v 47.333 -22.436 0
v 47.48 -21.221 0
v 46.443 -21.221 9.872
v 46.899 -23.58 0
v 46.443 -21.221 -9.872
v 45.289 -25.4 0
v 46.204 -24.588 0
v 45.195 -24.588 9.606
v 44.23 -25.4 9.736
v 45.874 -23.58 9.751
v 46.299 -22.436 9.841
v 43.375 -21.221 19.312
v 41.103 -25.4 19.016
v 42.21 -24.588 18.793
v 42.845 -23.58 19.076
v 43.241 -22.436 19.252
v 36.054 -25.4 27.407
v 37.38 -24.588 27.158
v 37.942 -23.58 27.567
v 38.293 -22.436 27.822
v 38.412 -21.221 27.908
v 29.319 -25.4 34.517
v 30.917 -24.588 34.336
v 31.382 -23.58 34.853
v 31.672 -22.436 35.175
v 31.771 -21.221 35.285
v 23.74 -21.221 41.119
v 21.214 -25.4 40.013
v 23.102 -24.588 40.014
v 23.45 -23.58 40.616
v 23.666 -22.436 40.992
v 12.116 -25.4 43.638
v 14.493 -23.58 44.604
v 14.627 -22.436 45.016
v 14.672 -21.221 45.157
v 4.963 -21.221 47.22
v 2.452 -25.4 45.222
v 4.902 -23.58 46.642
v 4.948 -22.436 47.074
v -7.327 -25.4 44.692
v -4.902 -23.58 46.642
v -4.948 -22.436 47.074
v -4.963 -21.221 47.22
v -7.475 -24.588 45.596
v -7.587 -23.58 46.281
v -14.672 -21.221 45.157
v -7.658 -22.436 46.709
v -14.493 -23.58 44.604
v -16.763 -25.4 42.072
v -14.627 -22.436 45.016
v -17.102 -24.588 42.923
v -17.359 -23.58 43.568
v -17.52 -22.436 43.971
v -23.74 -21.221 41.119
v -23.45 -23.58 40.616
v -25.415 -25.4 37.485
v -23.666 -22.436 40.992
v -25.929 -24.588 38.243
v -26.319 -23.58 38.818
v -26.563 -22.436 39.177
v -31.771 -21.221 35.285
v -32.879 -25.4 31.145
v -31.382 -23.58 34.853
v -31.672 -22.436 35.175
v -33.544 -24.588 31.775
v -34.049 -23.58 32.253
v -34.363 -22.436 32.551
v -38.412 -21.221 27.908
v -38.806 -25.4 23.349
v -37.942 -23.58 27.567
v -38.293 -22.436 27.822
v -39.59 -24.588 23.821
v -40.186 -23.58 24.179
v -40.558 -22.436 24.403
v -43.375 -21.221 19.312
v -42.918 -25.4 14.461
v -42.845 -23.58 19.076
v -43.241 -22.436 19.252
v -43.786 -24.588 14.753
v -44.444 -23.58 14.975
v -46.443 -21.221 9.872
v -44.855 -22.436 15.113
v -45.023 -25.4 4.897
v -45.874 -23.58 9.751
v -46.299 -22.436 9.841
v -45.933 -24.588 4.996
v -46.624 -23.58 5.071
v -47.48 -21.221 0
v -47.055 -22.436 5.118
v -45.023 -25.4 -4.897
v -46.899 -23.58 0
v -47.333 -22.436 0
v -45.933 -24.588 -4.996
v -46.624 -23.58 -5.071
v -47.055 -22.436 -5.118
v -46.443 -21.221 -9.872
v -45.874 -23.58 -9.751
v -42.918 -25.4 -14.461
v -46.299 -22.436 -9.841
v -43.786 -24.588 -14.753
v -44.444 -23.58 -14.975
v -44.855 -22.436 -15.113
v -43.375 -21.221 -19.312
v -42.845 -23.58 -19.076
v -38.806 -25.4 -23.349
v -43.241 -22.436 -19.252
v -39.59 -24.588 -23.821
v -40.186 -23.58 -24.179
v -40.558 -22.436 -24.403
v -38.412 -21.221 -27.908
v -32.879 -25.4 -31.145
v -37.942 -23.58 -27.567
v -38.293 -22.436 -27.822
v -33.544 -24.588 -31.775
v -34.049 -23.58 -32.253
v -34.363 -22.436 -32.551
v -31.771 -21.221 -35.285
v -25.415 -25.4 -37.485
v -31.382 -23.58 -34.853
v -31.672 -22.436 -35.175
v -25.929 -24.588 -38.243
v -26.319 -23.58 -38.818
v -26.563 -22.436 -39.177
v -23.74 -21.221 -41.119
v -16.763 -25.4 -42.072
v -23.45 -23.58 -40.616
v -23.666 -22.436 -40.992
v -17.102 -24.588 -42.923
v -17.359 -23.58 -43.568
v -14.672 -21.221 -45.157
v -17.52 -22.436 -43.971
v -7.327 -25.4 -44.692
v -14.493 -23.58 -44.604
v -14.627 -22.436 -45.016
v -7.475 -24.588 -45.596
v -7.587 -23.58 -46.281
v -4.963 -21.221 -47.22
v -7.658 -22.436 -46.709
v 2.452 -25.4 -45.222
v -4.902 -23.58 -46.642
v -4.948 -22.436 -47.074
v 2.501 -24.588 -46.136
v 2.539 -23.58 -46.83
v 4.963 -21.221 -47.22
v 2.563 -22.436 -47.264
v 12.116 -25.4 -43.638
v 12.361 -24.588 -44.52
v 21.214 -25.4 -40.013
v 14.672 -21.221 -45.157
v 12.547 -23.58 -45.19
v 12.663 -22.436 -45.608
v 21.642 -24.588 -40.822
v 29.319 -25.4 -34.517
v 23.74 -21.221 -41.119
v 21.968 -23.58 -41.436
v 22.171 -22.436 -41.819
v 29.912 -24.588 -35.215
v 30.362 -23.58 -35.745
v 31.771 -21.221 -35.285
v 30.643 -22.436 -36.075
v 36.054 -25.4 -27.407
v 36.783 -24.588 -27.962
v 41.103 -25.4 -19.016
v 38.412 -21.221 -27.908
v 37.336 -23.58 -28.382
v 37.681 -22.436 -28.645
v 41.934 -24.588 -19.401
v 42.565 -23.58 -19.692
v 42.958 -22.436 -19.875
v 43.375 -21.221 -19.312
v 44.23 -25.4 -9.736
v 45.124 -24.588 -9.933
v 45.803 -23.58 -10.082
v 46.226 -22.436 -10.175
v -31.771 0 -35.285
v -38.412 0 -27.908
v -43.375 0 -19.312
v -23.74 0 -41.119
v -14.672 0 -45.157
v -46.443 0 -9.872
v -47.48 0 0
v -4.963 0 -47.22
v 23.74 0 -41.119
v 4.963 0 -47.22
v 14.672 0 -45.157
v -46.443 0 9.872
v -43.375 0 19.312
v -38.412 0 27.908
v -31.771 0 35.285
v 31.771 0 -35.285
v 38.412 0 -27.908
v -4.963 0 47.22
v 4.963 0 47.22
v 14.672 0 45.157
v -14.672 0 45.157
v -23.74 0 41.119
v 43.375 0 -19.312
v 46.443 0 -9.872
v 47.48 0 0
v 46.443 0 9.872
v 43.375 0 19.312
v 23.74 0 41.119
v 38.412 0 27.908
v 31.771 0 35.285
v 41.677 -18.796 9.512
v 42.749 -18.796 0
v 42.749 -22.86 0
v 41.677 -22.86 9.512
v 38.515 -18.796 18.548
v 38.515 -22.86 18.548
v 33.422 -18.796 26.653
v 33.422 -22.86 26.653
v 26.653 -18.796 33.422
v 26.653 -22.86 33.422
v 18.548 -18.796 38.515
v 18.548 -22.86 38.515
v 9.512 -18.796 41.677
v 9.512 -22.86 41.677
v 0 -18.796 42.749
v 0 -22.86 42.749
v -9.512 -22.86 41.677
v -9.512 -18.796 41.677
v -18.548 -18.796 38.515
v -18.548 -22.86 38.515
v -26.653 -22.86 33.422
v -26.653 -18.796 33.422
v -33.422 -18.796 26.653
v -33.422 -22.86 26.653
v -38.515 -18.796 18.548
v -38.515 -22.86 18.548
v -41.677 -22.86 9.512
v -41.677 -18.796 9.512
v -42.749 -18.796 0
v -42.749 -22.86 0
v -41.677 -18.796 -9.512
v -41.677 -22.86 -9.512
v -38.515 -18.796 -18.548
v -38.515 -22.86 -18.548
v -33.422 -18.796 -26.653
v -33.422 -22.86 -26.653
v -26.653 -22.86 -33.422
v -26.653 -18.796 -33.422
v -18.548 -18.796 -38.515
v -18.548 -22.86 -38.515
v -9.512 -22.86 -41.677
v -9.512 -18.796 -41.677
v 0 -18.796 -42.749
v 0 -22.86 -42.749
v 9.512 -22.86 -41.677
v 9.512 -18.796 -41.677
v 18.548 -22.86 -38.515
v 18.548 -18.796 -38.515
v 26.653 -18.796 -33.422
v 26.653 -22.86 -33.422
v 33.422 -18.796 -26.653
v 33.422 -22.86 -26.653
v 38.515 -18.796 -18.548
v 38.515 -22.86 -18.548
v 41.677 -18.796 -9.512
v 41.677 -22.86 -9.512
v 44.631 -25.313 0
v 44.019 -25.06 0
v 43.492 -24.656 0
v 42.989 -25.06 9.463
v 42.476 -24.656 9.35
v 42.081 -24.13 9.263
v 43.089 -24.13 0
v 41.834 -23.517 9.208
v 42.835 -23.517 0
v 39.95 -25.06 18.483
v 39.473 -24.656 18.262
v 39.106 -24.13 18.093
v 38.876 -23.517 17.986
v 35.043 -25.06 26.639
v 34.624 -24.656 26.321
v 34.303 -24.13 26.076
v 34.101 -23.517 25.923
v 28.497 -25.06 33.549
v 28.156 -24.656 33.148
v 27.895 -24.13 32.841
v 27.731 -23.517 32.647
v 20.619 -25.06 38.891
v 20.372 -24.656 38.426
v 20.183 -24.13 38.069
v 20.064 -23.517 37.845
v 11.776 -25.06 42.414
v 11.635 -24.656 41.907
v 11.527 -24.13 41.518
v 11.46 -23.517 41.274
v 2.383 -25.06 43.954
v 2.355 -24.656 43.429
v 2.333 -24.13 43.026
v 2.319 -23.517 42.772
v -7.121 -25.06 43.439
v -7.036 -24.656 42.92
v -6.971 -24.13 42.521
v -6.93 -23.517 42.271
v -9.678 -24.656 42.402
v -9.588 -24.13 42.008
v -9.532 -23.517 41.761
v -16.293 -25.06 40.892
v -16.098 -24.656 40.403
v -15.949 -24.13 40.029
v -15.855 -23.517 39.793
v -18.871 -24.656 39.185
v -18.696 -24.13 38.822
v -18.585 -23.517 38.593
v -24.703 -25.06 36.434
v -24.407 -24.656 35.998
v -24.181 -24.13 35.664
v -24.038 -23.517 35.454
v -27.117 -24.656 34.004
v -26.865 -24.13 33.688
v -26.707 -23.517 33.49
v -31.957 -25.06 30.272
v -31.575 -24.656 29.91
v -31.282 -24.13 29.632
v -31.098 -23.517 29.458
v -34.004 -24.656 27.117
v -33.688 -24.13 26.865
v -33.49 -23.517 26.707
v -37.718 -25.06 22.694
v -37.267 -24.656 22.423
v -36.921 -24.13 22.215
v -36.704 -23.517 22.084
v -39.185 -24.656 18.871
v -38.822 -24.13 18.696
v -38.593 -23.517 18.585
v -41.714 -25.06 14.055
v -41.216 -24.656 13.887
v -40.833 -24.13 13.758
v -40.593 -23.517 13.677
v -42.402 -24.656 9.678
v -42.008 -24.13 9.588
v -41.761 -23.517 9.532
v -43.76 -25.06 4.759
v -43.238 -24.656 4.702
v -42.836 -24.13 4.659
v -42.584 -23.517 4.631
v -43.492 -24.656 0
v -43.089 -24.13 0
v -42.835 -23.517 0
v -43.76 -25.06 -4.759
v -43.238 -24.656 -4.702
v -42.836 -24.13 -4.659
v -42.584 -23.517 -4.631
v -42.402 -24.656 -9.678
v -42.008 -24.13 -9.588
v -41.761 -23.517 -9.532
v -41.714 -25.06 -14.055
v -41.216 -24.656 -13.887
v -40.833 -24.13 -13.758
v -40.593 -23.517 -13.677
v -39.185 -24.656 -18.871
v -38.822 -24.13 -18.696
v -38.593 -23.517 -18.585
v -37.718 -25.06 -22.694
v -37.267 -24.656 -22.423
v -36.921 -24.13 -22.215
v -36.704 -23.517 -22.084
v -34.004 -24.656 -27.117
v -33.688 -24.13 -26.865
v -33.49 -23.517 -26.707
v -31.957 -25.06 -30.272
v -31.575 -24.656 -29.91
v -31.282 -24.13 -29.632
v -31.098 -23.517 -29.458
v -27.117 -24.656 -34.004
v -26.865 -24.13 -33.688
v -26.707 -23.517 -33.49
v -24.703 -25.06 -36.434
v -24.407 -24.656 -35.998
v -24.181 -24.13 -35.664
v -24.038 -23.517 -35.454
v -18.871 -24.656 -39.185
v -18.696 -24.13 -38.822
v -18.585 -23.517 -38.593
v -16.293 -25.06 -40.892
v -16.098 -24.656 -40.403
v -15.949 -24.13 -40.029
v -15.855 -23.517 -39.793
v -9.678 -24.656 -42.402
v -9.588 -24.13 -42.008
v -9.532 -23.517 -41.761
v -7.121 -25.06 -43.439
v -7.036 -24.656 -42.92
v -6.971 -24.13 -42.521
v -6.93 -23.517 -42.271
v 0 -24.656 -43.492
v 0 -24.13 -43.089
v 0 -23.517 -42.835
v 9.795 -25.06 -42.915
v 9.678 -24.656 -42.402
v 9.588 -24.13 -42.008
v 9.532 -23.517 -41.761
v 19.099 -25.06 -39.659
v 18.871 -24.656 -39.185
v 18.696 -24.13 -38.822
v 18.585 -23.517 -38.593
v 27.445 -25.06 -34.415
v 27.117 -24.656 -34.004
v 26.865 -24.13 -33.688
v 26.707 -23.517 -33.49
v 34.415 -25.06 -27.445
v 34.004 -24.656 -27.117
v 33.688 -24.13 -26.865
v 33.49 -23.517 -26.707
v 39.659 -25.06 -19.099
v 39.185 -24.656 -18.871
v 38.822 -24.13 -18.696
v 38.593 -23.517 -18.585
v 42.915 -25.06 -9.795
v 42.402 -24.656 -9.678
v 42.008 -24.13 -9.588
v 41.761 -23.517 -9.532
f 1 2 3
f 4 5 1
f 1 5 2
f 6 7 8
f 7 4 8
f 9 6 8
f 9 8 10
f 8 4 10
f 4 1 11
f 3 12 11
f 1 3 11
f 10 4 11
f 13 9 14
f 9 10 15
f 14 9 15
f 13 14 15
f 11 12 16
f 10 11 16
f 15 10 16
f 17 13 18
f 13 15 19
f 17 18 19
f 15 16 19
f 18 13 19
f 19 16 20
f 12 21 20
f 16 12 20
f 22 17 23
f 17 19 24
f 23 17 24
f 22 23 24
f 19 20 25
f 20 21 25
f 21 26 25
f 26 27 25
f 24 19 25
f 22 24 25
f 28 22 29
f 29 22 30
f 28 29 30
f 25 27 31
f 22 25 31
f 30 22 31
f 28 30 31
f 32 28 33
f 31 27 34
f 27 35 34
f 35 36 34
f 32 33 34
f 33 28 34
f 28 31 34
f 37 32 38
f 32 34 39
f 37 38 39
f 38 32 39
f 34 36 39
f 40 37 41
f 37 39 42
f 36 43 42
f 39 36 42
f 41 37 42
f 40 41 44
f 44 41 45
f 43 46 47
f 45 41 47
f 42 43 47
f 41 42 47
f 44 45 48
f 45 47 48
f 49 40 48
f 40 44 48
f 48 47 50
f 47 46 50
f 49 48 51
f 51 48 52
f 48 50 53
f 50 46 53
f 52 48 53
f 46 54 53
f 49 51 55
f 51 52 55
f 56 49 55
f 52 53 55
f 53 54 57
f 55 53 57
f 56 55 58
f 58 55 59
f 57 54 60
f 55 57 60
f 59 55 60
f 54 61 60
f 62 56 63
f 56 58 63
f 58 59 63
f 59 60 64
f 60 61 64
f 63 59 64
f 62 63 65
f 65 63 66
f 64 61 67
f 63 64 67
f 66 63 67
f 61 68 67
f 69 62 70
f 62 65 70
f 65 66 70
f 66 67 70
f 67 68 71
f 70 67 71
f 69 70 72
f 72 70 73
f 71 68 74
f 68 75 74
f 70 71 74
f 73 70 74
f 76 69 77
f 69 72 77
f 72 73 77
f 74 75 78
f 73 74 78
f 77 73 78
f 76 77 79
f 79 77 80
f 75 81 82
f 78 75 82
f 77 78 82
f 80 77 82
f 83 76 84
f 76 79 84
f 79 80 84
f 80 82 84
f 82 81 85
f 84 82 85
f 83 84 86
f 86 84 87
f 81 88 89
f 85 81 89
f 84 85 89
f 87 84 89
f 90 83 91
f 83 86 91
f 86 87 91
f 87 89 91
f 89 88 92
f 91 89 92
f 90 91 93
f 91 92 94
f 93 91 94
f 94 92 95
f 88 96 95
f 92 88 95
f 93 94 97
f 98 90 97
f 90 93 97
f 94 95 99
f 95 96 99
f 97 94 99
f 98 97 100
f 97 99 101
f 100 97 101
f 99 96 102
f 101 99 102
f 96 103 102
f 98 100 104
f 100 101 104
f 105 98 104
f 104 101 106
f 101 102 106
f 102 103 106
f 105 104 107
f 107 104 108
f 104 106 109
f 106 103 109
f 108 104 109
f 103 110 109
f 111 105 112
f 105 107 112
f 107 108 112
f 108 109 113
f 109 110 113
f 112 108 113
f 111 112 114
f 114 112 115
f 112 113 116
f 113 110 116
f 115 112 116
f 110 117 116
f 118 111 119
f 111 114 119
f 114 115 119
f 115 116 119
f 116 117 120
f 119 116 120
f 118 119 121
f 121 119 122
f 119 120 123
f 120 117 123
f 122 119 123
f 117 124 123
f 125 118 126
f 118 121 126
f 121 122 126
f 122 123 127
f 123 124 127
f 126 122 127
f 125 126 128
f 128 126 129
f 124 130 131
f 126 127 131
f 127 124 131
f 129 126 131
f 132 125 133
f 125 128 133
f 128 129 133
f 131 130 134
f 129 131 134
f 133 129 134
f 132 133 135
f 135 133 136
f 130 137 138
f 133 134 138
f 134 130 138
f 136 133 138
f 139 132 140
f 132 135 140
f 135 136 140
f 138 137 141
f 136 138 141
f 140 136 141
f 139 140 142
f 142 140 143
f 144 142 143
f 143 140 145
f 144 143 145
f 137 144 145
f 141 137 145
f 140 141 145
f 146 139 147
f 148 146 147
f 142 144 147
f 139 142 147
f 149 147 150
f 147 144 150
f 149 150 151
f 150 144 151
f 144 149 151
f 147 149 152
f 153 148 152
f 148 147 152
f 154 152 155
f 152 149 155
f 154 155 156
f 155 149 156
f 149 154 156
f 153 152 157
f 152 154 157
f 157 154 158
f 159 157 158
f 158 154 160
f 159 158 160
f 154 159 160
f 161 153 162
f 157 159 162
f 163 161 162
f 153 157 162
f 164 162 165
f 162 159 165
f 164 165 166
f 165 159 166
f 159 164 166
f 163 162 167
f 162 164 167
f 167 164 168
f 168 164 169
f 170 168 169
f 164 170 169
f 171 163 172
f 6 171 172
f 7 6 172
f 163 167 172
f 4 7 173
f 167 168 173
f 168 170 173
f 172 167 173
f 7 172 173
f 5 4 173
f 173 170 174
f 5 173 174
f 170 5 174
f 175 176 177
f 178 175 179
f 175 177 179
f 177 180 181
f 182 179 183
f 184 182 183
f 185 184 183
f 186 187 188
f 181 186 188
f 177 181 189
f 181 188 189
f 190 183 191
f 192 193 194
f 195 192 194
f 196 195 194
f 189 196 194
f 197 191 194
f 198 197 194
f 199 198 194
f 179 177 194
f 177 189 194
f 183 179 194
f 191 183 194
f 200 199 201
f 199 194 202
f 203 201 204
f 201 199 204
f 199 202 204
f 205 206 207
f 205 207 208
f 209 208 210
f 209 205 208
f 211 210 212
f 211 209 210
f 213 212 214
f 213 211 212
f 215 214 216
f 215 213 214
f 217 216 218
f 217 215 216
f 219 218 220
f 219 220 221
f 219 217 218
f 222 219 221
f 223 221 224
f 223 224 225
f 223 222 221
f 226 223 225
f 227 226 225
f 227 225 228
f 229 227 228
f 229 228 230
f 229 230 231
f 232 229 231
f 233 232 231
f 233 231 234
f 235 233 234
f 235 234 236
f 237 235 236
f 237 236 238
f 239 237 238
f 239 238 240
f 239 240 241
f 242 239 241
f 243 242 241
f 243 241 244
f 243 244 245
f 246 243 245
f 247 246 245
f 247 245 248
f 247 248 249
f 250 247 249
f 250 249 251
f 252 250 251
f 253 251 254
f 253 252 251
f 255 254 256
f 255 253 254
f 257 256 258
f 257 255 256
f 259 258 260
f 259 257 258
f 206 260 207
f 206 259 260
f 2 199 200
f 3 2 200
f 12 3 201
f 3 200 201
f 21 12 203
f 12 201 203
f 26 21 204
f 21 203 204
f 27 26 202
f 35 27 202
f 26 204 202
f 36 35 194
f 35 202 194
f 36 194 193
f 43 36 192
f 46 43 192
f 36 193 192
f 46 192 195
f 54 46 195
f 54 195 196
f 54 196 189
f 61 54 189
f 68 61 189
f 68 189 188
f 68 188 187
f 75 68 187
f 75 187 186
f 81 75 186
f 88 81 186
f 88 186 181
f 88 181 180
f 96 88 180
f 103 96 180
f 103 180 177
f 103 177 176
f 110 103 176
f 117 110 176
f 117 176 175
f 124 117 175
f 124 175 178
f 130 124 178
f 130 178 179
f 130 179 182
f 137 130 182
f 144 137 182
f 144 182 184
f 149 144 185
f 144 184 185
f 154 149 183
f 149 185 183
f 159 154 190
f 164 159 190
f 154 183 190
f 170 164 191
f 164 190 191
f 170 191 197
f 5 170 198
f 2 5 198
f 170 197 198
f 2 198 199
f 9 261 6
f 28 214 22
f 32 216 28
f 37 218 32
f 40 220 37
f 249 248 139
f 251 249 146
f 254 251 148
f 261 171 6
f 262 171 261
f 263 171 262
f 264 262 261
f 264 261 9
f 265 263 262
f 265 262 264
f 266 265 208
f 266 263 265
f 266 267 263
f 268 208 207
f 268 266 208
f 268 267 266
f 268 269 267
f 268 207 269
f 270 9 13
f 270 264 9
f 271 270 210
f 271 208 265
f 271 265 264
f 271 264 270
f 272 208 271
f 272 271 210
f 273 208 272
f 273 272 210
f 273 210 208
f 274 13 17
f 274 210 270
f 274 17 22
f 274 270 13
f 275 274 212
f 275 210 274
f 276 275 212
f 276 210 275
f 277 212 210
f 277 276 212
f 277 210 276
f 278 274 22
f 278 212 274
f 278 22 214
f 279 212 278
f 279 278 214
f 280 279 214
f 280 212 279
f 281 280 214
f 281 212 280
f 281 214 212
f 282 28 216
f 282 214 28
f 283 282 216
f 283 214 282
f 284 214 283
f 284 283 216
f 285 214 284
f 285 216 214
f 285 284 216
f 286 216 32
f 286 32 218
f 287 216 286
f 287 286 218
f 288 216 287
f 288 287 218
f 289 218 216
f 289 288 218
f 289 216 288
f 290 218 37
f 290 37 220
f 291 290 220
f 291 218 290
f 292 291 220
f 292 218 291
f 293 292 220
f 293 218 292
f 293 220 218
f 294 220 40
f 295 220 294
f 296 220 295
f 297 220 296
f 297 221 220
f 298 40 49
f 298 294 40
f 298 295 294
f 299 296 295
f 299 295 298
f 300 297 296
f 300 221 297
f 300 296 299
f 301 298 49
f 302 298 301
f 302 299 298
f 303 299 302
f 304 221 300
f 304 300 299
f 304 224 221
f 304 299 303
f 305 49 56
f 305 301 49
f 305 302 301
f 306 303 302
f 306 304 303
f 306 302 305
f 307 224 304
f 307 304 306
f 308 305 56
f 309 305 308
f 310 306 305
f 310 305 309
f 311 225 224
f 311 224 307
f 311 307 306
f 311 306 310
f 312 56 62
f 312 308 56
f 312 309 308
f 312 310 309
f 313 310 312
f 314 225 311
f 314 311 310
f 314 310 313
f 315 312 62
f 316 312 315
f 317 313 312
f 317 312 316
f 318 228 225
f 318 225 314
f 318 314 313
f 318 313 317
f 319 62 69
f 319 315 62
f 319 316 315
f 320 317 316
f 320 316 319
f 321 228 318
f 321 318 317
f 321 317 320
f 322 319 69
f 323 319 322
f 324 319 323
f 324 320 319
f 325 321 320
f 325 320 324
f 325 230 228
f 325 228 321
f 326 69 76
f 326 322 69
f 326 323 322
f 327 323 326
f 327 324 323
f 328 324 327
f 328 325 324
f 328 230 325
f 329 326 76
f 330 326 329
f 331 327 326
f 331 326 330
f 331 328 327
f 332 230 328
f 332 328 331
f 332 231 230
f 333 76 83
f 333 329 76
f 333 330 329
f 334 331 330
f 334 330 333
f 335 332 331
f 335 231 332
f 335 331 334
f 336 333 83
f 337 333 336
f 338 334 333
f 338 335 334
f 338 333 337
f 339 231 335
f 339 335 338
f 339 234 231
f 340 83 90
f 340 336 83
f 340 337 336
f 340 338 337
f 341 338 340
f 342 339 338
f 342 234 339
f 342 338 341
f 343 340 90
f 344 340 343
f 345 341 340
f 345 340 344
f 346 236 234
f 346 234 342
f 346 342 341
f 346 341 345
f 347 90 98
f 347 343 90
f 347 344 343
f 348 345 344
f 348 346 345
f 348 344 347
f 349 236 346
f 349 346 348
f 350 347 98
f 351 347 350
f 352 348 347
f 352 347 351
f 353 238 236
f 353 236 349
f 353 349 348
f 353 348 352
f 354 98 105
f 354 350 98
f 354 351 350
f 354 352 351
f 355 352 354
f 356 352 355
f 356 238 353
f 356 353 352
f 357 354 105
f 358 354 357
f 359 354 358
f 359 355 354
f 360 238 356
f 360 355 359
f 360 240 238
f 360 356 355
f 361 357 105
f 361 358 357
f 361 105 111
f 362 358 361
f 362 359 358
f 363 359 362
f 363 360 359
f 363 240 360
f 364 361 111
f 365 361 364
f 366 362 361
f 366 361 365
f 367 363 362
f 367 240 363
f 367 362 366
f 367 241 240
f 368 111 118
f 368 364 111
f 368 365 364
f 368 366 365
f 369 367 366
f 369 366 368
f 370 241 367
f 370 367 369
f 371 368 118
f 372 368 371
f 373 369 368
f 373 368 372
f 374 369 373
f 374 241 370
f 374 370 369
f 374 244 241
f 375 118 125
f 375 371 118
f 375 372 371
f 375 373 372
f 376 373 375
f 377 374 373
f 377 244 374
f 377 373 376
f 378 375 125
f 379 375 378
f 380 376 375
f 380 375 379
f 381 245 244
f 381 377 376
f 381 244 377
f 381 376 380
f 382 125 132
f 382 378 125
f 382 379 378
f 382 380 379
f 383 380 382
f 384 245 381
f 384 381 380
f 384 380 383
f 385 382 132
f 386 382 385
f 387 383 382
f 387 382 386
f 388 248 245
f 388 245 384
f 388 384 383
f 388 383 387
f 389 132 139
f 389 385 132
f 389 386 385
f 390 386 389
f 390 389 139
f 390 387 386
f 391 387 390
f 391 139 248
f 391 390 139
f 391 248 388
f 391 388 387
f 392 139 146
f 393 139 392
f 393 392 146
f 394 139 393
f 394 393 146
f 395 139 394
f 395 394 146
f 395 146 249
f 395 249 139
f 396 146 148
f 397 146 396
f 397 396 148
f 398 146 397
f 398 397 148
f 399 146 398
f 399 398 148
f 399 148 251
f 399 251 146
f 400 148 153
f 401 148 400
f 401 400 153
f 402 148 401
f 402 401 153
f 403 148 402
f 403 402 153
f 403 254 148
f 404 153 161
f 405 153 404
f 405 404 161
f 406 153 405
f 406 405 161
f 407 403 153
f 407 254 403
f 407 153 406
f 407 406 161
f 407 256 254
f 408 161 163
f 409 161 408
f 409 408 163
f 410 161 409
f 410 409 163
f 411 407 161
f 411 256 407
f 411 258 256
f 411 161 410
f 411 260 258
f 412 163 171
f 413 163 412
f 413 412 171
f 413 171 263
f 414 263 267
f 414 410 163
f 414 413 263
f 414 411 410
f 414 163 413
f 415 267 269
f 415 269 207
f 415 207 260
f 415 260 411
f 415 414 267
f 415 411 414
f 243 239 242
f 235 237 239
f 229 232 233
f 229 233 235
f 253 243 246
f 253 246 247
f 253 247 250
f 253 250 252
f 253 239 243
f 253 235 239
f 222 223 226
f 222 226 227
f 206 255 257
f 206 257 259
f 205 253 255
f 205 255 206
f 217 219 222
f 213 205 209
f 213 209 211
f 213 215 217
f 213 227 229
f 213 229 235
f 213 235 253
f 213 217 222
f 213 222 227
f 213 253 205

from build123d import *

# Parameters (mm, degrees)
F0_R     = 47.4803675011
F0_R_2   = 42.7485217124
F1_DEPTH = 25.4
F2_DEPTH = 18.796
F3_R     = 2.54


# Not quite as in the source:
# - a fillet or chamfer that OpenCascade refuses, or shapes differently, is made with other operations: its cross-section is extruded or revolved along the edge and cut away or added


with BuildPart() as f1:
    # F0 (on Front) → F1 (new body)
    with BuildSketch(Plane.XZ):
        Circle(F0_R)
        Circle(F0_R_2, mode=Mode.SUBTRACT)
    extrude(amount=F1_DEPTH)

    # F0 (on Front) → F2 (join)
    with BuildSketch(Plane.XZ):
        Circle(F0_R_2)
    extrude(amount=F2_DEPTH)

    # F3
    f3_edges = [f1.edges().sort_by_distance(p)[0] for p in [
        (-42.748522, -25.4, 0),
    ]]
    fillet(f3_edges, radius=F3_R)

    # F4: fillet of radius 5.08 on 1 edges, made by hand

    # F4_s1 → F4_t2 (revolve, cut)
    with BuildSketch(Plane.XY):
        with BuildLine():
            ThreePointArc((45.2885217124, -25.4), (46.8991575269, -23.5803996015), (47.4803675011, -21.2208894186))
            Line((47.4803675011, -21.2208894186), (47.4803675011, -25.4))
            Line((47.4803675011, -25.4), (45.2885217124, -25.4))
        make_face()
    revolve(axis=Axis((0, -25.4, 0), (0, -1, 0)), mode=Mode.SUBTRACT)


solid = f1.part
